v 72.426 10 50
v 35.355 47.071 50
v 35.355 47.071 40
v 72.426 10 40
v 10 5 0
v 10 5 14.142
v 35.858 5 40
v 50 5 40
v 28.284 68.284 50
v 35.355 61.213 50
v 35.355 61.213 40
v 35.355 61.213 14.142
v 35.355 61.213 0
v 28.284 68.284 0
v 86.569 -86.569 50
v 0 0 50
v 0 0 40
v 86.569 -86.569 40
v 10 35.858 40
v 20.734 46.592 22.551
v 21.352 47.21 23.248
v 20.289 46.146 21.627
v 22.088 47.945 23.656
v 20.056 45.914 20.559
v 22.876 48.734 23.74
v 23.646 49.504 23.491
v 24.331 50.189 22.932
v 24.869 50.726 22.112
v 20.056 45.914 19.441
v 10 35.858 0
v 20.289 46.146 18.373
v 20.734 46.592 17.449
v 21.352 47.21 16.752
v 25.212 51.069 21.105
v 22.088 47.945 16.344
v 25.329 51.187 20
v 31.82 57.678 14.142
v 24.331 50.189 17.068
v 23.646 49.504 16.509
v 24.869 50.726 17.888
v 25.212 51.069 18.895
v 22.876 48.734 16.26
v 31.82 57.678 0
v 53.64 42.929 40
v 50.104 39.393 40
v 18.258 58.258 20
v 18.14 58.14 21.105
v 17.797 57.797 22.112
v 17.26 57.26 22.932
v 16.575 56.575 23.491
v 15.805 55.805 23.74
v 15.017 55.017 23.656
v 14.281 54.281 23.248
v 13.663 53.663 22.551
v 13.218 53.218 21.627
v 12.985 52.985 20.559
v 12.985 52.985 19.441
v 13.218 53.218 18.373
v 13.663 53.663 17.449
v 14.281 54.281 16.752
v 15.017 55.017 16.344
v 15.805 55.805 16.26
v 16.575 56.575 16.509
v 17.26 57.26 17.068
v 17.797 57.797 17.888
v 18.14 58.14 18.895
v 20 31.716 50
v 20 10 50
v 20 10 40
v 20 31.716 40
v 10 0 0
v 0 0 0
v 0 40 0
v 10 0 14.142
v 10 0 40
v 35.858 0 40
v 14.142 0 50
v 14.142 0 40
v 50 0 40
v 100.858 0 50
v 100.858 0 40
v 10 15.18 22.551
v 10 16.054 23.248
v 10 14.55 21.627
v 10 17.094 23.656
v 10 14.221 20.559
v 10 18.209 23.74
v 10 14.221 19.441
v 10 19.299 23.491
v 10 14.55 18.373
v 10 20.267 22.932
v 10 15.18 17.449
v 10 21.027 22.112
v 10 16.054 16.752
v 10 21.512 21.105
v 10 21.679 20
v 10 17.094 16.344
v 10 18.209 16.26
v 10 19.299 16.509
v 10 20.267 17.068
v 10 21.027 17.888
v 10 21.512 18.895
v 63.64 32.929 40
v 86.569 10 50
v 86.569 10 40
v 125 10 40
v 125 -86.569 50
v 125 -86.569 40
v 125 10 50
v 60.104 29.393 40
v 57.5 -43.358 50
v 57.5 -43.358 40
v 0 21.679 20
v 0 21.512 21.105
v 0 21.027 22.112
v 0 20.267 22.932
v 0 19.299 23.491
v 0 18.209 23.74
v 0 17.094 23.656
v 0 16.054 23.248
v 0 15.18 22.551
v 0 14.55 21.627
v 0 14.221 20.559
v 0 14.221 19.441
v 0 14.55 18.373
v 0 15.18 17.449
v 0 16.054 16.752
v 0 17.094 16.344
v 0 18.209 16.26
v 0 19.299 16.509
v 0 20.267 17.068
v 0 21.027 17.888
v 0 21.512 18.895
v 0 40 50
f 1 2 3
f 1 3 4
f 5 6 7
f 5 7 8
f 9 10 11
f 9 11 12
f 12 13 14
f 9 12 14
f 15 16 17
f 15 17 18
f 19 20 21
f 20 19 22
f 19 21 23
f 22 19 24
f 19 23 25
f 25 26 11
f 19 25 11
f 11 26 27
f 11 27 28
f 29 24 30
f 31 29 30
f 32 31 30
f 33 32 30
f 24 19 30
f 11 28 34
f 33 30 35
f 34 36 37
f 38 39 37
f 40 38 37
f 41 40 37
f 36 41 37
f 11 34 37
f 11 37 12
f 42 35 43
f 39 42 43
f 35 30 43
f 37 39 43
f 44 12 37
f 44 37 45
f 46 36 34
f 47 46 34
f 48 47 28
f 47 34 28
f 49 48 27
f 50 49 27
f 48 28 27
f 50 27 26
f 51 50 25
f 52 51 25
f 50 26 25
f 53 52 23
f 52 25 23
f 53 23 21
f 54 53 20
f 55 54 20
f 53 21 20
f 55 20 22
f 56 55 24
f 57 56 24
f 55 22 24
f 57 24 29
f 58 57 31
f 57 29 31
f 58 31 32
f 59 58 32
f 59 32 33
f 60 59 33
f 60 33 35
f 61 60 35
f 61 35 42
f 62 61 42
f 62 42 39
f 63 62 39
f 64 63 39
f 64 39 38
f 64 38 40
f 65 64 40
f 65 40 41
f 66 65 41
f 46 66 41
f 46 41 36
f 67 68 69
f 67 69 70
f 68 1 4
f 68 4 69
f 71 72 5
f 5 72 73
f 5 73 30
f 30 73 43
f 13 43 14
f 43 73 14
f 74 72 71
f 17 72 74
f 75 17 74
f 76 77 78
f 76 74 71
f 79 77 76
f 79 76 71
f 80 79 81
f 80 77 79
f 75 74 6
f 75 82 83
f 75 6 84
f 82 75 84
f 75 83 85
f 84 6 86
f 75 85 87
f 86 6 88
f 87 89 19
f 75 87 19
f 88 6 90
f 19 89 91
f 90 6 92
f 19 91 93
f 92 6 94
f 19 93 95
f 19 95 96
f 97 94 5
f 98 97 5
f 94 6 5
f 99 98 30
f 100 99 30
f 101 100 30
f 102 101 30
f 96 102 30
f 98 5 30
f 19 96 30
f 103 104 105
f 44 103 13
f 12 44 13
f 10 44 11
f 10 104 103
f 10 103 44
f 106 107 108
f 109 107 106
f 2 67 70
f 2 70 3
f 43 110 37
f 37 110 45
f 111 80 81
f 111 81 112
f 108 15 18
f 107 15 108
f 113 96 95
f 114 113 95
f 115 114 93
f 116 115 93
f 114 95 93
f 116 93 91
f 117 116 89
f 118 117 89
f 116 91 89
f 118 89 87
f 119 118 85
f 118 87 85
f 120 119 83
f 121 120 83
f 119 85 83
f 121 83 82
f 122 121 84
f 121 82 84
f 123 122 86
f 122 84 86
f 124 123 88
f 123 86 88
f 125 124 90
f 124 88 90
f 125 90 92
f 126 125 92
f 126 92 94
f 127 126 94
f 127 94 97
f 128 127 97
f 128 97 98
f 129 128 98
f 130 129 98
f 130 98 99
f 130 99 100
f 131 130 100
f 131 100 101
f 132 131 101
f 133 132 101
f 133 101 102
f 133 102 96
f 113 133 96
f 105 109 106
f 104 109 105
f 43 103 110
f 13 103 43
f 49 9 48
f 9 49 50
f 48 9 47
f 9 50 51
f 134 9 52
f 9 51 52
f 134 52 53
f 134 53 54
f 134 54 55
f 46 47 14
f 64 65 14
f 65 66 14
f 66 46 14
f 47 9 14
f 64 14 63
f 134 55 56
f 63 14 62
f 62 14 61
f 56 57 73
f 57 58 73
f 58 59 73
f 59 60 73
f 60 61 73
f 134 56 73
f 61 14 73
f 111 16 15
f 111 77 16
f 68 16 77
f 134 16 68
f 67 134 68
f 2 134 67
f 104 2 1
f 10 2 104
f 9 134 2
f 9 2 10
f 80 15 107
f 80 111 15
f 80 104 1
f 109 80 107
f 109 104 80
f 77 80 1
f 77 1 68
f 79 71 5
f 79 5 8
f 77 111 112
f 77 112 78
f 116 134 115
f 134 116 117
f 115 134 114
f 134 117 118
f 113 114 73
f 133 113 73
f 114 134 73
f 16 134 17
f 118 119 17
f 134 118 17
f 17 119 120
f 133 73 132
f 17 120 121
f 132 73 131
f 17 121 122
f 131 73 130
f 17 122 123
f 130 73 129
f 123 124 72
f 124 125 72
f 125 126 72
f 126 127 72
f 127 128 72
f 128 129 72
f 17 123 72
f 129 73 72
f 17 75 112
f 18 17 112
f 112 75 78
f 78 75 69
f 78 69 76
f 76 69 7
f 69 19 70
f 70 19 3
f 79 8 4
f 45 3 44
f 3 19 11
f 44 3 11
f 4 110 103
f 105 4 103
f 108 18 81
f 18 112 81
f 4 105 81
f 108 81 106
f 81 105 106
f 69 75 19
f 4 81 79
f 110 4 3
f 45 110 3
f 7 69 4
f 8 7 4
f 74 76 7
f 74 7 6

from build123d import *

# Parameters (mm, degrees)
F1_DEPTH  = 50
F3_DEPTH  = 10
F5_R      = 3.75
F6_DEPTH  = 10.001
F4_R      = 3.75
F7_DEPTH  = 30.001
F9_DEPTH  = 5
F11_DEPTH = 5
F13_DEPTH = 10


with BuildPart() as f1:
    # F0 (on Top) → F1 (new body)
    with BuildSketch(Plane.XY):
        Polygon((0, 40), (0, 0), (10, 0), (10, 35.8578643763), (35.3553390593, 61.2132034356), (28.2842712475, 68.2842712475), align=None)
    extrude(amount=F1_DEPTH)

    # F2 (on face) → F3 (join)
    with BuildSketch(Plane.XY.offset(50)):
        Polygon((86.5685424949, 10), (35.3553390593, 61.2132034356), (10, 35.8578643763), (10, 0), (125, 0), (125, 10), align=None)
        Polygon((35.3553390593, 47.0710678119), (72.4264068712, 10), (20, 10), (20, 31.7157287525), align=None, mode=Mode.SUBTRACT)
    extrude(amount=-F3_DEPTH)

    # F5 (on face) → F6 (cut, through all)
    with BuildSketch(Plane.YZ.offset(10)):
        with Locations((17.9289321881, 20)):
            Circle(F5_R)
    extrude(amount=-F6_DEPTH, mode=Mode.SUBTRACT)

    # F4 (on face) → F7 (cut, through all)
    with BuildSketch(Plane(origin=(-12.9289321881, 12.9289321881, 0), x_dir=(0.7071067812, 0.7071067812, 0), z_dir=(0.7071067812, -0.7071067812, 0))):
        with Locations((50.3553390593, 20)):
            Circle(F4_R)
    extrude(amount=-F7_DEPTH, mode=Mode.SUBTRACT)

    # F8 (on face) → F9 (join)
    with BuildSketch(Plane.XZ):
        Polygon((10, 14.1421356237), (10, 0), (50, 40), (35.8578643763, 40), align=None)
    extrude(amount=-F9_DEPTH)

    # F10 (on face) → F11 (join)
    with BuildSketch(Plane(origin=(48.2842712475, 48.2842712475, 0), x_dir=(-0.7071067812, 0.7071067812, 0), z_dir=(0.7071067812, 0.7071067812, 0))):
        Polygon((-21.7157287525, 40), (18.2842712475, 0), (18.2842712475, 14.1421356237), (-7.5735931288, 40), align=None)
    extrude(amount=-F11_DEPTH)

    # F12 (on face) → F13 (join, through all)
    with BuildSketch(Plane.XY.offset(50)):
        Polygon((14.1421356237, 0), (0, 0), (86.5685424949, -86.5685424949), (125, -86.5685424949), (125, -76.5685424949), (125, 0), (115, 0), (100.8578643763, 0), (57.5, -43.3578643763), align=None)
        Polygon((64.5710678119, -50.4289321881), (115, 0), (115, -76.5685424949), (90.7106781187, -76.5685424949), align=None, mode=Mode.SUBTRACT)
        Polygon((115, -76.5685424949), (115, 0), (64.5710678119, -50.4289321881), (90.7106781187, -76.5685424949), align=None)
    extrude(amount=-F13_DEPTH)


solid = f1.part
